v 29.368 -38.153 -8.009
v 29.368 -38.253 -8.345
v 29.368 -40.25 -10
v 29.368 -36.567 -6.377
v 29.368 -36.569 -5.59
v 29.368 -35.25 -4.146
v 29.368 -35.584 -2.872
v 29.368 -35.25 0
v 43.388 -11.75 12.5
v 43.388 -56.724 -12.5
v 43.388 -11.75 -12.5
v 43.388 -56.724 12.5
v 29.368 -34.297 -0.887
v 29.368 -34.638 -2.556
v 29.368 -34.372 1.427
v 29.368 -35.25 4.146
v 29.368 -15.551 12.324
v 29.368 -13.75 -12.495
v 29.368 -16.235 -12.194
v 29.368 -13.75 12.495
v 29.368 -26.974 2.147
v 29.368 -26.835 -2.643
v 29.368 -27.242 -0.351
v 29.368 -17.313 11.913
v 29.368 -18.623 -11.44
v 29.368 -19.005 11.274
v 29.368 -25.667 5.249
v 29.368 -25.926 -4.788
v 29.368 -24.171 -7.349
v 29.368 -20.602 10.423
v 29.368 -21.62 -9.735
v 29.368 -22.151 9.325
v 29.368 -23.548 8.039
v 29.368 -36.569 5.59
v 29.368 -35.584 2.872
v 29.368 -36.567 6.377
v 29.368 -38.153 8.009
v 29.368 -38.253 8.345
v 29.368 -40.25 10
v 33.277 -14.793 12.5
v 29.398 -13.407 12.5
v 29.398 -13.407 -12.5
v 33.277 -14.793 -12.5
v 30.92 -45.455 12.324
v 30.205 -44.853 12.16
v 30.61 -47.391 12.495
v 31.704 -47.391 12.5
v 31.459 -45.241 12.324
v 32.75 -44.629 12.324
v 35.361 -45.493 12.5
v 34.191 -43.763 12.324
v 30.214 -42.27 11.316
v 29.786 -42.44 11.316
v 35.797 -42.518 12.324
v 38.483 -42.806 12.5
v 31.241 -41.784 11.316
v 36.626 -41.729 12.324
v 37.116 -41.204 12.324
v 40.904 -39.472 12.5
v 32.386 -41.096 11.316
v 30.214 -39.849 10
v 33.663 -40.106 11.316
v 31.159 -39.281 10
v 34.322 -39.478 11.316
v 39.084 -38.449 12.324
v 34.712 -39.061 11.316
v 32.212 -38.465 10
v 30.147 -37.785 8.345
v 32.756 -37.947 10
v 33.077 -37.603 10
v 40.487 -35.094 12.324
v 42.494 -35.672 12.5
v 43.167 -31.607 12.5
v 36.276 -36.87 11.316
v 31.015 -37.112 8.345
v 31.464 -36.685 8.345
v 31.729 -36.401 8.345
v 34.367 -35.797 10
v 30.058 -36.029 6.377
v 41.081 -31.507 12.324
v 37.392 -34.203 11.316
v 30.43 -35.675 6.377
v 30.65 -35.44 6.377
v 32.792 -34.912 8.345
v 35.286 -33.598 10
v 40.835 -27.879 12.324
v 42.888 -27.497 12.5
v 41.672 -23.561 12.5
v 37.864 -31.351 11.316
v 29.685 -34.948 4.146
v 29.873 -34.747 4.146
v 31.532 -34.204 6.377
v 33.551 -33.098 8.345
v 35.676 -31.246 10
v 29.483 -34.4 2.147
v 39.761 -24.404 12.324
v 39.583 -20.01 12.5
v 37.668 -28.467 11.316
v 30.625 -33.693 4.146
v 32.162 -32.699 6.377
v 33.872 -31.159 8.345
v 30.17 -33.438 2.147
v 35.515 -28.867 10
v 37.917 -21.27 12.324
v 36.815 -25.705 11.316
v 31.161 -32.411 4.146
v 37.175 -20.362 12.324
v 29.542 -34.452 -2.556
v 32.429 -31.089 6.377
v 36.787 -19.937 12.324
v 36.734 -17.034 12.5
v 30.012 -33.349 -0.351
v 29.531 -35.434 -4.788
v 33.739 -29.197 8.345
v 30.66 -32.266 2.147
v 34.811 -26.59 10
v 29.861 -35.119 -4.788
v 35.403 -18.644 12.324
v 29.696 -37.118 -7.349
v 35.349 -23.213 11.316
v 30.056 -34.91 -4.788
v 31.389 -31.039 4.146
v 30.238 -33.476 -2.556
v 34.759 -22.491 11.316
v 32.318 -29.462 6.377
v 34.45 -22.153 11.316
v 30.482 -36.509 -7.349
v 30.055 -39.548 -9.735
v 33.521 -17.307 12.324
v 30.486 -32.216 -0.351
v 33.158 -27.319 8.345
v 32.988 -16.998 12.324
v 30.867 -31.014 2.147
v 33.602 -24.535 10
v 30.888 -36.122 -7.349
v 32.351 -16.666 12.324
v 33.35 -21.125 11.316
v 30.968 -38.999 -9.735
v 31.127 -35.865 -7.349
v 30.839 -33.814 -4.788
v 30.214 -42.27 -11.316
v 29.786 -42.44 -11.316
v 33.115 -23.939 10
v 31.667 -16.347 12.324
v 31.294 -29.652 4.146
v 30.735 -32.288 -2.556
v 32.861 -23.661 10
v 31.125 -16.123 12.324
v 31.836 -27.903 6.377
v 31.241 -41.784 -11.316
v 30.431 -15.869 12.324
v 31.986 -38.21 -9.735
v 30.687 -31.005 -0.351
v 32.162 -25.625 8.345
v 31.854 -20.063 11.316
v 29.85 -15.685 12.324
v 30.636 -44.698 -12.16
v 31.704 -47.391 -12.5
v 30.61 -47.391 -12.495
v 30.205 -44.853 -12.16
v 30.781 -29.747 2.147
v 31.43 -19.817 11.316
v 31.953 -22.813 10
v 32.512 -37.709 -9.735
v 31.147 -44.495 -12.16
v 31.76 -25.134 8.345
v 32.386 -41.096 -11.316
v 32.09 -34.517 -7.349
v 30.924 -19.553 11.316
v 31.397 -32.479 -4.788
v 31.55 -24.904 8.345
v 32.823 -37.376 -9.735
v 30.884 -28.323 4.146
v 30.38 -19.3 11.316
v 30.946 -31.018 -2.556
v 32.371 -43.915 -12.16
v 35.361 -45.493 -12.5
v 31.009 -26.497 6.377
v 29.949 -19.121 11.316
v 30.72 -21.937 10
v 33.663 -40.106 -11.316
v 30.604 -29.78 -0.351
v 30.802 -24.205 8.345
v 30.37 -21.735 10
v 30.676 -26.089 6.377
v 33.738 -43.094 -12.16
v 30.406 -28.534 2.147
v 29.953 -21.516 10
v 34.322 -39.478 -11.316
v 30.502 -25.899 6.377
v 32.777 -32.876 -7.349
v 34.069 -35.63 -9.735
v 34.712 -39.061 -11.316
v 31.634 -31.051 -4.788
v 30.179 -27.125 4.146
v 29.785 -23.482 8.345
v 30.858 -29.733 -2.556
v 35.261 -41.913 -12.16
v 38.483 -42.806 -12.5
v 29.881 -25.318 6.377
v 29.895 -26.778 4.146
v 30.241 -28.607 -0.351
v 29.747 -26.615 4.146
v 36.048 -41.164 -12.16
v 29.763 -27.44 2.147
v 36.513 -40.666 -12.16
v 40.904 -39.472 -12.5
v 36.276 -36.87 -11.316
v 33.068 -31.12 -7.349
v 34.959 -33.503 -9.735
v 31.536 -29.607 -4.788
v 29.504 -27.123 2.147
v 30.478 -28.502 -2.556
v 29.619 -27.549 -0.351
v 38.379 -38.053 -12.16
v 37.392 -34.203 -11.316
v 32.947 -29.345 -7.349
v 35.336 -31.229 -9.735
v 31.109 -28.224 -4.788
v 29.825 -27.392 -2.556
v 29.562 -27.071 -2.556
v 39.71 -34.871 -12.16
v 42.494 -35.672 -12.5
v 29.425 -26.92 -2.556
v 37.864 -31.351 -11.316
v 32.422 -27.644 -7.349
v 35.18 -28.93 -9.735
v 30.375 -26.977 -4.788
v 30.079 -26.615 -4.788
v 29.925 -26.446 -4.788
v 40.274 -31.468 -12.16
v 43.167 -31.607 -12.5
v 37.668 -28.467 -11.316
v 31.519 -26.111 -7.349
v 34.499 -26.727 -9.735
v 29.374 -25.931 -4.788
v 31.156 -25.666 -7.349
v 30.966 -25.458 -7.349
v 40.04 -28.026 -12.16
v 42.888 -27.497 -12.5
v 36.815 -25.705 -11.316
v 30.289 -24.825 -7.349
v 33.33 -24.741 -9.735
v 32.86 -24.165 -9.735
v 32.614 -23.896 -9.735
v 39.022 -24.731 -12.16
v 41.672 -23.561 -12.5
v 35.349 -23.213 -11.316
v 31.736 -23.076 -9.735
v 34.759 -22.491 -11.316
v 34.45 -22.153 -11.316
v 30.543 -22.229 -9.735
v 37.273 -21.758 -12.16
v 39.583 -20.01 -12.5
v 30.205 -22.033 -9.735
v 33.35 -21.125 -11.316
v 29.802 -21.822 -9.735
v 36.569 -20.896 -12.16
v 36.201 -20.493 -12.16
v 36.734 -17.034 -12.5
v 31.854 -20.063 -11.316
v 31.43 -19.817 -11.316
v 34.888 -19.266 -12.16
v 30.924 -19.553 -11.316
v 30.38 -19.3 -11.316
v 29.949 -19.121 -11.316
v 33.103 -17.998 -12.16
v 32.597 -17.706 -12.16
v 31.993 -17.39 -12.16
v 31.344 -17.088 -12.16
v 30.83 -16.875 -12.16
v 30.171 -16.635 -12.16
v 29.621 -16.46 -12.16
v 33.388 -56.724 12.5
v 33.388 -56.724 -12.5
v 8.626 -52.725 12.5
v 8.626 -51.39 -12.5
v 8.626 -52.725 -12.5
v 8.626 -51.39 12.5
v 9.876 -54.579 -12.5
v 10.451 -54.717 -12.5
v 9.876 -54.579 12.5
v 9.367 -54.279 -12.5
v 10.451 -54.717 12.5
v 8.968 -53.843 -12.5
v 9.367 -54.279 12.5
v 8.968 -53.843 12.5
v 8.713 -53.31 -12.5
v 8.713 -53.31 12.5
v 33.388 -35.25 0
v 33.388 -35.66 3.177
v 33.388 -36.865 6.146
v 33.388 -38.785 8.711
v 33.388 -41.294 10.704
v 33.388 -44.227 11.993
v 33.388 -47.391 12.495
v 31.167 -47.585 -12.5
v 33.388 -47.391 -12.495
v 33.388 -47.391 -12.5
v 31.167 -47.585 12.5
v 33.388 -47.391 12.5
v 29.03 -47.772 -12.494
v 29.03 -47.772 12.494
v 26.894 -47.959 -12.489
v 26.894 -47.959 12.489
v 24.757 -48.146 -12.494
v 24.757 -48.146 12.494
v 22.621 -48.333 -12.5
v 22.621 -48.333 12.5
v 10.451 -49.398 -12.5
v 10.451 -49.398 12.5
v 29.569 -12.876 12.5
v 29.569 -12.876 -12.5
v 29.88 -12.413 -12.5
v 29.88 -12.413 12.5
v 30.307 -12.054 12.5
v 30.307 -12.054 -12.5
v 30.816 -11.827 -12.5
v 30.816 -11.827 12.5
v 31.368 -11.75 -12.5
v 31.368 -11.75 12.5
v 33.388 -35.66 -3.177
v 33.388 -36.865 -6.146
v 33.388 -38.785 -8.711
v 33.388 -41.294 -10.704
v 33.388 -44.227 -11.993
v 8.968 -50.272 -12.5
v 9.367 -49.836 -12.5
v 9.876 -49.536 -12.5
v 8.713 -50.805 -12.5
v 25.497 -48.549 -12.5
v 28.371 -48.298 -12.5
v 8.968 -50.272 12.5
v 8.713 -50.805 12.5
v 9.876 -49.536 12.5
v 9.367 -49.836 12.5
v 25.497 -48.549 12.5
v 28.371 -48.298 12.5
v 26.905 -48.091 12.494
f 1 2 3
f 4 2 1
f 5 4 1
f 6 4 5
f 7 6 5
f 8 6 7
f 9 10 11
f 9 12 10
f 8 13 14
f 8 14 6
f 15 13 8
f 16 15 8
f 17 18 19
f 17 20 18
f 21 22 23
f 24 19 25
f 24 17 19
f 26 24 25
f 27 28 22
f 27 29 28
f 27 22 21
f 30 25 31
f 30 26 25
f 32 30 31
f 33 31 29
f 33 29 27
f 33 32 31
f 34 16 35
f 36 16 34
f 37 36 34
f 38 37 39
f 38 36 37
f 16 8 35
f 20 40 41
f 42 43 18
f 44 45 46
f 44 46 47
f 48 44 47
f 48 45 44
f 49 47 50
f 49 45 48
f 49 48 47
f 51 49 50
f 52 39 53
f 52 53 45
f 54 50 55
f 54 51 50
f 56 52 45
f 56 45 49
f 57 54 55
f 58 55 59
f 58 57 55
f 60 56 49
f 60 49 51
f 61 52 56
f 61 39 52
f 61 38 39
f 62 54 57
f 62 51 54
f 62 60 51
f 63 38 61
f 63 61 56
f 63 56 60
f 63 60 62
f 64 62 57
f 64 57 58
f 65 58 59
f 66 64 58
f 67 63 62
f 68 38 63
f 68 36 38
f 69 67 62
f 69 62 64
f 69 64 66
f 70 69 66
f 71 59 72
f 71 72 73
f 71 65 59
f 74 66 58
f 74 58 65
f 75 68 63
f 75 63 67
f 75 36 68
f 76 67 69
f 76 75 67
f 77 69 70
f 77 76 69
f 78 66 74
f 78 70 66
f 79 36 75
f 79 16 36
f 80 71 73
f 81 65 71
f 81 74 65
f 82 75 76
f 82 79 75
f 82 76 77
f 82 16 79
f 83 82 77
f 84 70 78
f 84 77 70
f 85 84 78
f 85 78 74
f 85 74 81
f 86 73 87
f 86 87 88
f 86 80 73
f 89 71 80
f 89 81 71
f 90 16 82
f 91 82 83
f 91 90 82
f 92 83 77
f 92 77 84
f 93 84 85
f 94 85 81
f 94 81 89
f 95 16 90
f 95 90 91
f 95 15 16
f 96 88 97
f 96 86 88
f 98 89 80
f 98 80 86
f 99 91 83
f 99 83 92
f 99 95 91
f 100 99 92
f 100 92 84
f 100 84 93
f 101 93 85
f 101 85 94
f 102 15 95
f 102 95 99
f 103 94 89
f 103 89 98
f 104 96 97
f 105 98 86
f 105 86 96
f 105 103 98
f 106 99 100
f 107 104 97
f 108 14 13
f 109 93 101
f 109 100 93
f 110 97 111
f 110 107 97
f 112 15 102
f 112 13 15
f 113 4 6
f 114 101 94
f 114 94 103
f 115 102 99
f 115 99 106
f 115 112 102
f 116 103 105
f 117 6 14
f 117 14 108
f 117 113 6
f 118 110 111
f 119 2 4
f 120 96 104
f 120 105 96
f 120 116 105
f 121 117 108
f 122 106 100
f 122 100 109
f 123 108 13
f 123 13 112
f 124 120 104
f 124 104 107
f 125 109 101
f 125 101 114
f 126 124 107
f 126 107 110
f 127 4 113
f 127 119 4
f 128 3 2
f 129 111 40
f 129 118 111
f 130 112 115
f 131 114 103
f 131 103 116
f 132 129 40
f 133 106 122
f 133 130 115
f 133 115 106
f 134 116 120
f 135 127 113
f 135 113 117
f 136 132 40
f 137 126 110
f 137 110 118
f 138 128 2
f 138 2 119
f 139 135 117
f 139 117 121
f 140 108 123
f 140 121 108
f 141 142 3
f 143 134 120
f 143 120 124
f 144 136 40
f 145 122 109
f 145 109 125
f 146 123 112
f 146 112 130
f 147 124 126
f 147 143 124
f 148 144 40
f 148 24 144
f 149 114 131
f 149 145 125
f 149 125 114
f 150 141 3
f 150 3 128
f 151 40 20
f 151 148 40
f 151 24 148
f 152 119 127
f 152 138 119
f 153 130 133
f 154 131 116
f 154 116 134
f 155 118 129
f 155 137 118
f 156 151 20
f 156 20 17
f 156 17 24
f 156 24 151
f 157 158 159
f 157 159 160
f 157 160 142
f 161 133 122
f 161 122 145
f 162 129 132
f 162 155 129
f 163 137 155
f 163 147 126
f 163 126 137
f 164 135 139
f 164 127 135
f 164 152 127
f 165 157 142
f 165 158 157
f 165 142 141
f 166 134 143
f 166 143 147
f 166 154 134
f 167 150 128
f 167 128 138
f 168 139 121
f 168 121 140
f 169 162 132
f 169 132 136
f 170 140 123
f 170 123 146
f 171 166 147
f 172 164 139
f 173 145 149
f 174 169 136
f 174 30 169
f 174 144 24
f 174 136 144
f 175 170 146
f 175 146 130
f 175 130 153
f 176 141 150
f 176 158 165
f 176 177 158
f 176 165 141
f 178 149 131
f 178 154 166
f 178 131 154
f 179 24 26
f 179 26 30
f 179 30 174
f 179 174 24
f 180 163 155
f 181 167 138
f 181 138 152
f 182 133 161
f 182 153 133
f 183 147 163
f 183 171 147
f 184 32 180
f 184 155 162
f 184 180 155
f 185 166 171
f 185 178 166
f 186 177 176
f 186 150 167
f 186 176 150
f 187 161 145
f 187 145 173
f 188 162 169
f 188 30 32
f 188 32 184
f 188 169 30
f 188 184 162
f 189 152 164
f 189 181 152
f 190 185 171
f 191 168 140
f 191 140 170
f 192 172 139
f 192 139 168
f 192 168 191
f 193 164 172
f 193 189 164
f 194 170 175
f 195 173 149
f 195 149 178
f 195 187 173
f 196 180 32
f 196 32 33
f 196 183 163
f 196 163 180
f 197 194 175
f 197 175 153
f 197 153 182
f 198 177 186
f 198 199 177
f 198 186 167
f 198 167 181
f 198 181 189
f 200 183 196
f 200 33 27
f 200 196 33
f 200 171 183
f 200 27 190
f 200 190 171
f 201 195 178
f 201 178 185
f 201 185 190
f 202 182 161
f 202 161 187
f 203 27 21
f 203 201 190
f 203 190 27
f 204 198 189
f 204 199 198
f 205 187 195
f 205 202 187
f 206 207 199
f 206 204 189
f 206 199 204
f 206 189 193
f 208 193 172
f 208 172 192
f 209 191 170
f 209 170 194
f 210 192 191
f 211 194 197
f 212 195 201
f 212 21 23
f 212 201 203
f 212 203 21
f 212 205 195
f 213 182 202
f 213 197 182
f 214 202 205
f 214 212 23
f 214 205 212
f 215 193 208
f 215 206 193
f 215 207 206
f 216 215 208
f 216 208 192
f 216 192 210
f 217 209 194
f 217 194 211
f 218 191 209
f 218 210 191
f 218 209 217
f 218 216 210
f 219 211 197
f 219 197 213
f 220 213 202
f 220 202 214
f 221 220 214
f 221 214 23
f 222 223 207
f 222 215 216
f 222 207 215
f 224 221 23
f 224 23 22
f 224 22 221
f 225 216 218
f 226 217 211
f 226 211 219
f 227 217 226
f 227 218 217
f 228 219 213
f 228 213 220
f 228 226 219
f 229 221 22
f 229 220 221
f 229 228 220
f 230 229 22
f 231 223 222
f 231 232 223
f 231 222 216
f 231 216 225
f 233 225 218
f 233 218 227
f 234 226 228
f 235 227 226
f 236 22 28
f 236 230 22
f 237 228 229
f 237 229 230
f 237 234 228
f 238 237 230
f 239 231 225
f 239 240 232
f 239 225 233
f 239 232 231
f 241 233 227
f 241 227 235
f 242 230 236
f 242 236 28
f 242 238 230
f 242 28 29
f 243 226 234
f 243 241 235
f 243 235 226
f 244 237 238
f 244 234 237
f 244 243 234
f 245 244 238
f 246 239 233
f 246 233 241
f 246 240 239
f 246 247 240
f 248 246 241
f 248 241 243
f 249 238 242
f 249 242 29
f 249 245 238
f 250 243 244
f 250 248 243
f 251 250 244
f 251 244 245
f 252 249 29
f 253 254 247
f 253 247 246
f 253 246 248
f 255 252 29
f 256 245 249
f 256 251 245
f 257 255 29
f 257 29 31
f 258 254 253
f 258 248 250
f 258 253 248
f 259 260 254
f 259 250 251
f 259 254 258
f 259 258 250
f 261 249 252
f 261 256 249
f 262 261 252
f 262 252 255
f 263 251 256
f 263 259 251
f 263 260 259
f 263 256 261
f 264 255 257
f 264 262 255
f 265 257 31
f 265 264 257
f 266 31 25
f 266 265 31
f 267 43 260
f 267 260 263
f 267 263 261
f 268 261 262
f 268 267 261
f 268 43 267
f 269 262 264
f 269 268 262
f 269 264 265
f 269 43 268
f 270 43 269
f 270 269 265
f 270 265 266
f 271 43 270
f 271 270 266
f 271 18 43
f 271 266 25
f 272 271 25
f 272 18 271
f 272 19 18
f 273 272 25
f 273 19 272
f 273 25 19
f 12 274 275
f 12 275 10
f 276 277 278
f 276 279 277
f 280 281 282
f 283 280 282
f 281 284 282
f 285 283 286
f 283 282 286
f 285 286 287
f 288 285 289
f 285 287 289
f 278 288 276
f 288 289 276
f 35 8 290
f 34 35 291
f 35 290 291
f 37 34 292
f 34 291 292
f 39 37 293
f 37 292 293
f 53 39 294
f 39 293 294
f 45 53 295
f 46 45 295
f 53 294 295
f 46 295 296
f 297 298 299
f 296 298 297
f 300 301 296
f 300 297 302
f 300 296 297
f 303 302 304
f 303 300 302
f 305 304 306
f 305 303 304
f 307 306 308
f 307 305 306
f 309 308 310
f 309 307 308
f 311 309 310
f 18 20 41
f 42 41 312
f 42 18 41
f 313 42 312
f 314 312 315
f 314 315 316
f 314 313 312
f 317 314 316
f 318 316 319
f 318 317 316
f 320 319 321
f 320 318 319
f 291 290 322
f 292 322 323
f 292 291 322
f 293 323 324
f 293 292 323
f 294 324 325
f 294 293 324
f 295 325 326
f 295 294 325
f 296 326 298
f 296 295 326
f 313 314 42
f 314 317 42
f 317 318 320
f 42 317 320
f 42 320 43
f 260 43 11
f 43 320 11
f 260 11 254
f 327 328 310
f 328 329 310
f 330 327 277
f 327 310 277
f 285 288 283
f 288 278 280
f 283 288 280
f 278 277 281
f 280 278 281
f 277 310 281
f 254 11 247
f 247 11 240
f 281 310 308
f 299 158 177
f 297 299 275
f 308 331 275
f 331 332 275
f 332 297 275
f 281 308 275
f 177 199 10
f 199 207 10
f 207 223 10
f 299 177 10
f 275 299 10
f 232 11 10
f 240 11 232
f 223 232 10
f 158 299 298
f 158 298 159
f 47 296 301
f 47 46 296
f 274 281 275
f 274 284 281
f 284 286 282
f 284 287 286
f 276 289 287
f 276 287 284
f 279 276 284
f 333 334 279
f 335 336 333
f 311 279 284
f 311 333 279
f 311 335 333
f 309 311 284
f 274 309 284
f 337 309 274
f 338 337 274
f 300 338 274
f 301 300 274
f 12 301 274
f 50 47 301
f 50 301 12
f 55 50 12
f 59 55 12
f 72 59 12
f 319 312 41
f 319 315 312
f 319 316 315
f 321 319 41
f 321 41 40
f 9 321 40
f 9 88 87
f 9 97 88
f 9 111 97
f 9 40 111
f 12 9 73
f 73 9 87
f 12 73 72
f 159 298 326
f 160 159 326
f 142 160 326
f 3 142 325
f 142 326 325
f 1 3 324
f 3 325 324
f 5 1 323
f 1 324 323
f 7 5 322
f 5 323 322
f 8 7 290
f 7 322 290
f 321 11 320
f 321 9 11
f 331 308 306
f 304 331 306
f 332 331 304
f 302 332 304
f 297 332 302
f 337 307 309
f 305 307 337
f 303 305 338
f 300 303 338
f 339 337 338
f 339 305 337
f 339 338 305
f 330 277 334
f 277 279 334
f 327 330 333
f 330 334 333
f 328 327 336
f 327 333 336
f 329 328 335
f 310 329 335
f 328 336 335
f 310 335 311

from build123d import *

# Parameters (mm, degrees)
BOSS_EXTRUDE1_DEPTH = 12.5
BOSS_EXTRUDE2_DEPTH = 4.02005
FILLET2_R           = 2


with BuildPart() as part:
    # Sketch2 → Boss-Extrude1 (new, symmetric)
    with BuildSketch(Plane.XY):
        Polygon((29.367996497, -11.749519802), (29.367996497, -35.249519802), (33.388046748, -35.249519802), (33.388046748, -47.391114069), (8.625661213, -49.557542086), (8.625661213, -54.557542086), (33.388046748, -56.723970102), (43.388046748, -56.723970102), (43.388046748, -11.749519802), align=None)
    extrude(amount=BOSS_EXTRUDE1_DEPTH, both=True)

    # Sketch4 → Boss-Extrude2 (add)
    with BuildSketch(Plane.ZY.offset(-33.388046748)):
        with BuildLine():
            Line((-12.5, -35.249519802), (-12.5, -47.391114069))
            Line((-12.5, -47.391114069), (-12.494860757, -47.391114069))
            ThreePointArc((-12.494860757, -47.391114069), (-8.711197631, -38.784864994), (0, -35.249519802))
            Line((0, -35.249519802), (-12.5, -35.249519802))
        make_face()
        with BuildLine():
            Line((12.5, -35.249519802), (0, -35.249519802))
            ThreePointArc((0, -35.249519802), (8.711197631, -38.784864994), (12.494860757, -47.391114069))
            Line((12.494860757, -47.391114069), (12.5, -47.391114069))
            Line((12.5, -47.391114069), (12.5, -35.249519802))
        make_face()
    extrude(amount=BOSS_EXTRUDE2_DEPTH)

    # Sketch3 → Cut-Revolve1 (revolve, cut)
    with BuildSketch(Plane.ZY.offset(-25.388046748)):
        with BuildLine():
            Line((-12.5, -30.749519802), (12.5, -30.749519802))
            Line((12.5, -30.749519802), (12.5, -12.949519802))
            ThreePointArc((12.5, -12.949519802), (0, -25.449519802), (-12.5, -12.949519802))
            Line((-12.5, -12.949519802), (-12.5, -30.749519802))
        make_face()
    revolve(axis=Axis((25.388046748, -30.749519802, -12.5), (0, 0, 1)), mode=Mode.SUBTRACT)

    # Fillet2
    fillet2_edges = [part.edges().sort_by_distance(p)[0] for p in [
        (29.367996497, -11.749519802, 0),
        (8.625661213, -49.557542086, 0),
        (8.625661213, -54.557542086, 0),
    ]]
    fillet(fillet2_edges, radius=FILLET2_R)


solid = part.part
